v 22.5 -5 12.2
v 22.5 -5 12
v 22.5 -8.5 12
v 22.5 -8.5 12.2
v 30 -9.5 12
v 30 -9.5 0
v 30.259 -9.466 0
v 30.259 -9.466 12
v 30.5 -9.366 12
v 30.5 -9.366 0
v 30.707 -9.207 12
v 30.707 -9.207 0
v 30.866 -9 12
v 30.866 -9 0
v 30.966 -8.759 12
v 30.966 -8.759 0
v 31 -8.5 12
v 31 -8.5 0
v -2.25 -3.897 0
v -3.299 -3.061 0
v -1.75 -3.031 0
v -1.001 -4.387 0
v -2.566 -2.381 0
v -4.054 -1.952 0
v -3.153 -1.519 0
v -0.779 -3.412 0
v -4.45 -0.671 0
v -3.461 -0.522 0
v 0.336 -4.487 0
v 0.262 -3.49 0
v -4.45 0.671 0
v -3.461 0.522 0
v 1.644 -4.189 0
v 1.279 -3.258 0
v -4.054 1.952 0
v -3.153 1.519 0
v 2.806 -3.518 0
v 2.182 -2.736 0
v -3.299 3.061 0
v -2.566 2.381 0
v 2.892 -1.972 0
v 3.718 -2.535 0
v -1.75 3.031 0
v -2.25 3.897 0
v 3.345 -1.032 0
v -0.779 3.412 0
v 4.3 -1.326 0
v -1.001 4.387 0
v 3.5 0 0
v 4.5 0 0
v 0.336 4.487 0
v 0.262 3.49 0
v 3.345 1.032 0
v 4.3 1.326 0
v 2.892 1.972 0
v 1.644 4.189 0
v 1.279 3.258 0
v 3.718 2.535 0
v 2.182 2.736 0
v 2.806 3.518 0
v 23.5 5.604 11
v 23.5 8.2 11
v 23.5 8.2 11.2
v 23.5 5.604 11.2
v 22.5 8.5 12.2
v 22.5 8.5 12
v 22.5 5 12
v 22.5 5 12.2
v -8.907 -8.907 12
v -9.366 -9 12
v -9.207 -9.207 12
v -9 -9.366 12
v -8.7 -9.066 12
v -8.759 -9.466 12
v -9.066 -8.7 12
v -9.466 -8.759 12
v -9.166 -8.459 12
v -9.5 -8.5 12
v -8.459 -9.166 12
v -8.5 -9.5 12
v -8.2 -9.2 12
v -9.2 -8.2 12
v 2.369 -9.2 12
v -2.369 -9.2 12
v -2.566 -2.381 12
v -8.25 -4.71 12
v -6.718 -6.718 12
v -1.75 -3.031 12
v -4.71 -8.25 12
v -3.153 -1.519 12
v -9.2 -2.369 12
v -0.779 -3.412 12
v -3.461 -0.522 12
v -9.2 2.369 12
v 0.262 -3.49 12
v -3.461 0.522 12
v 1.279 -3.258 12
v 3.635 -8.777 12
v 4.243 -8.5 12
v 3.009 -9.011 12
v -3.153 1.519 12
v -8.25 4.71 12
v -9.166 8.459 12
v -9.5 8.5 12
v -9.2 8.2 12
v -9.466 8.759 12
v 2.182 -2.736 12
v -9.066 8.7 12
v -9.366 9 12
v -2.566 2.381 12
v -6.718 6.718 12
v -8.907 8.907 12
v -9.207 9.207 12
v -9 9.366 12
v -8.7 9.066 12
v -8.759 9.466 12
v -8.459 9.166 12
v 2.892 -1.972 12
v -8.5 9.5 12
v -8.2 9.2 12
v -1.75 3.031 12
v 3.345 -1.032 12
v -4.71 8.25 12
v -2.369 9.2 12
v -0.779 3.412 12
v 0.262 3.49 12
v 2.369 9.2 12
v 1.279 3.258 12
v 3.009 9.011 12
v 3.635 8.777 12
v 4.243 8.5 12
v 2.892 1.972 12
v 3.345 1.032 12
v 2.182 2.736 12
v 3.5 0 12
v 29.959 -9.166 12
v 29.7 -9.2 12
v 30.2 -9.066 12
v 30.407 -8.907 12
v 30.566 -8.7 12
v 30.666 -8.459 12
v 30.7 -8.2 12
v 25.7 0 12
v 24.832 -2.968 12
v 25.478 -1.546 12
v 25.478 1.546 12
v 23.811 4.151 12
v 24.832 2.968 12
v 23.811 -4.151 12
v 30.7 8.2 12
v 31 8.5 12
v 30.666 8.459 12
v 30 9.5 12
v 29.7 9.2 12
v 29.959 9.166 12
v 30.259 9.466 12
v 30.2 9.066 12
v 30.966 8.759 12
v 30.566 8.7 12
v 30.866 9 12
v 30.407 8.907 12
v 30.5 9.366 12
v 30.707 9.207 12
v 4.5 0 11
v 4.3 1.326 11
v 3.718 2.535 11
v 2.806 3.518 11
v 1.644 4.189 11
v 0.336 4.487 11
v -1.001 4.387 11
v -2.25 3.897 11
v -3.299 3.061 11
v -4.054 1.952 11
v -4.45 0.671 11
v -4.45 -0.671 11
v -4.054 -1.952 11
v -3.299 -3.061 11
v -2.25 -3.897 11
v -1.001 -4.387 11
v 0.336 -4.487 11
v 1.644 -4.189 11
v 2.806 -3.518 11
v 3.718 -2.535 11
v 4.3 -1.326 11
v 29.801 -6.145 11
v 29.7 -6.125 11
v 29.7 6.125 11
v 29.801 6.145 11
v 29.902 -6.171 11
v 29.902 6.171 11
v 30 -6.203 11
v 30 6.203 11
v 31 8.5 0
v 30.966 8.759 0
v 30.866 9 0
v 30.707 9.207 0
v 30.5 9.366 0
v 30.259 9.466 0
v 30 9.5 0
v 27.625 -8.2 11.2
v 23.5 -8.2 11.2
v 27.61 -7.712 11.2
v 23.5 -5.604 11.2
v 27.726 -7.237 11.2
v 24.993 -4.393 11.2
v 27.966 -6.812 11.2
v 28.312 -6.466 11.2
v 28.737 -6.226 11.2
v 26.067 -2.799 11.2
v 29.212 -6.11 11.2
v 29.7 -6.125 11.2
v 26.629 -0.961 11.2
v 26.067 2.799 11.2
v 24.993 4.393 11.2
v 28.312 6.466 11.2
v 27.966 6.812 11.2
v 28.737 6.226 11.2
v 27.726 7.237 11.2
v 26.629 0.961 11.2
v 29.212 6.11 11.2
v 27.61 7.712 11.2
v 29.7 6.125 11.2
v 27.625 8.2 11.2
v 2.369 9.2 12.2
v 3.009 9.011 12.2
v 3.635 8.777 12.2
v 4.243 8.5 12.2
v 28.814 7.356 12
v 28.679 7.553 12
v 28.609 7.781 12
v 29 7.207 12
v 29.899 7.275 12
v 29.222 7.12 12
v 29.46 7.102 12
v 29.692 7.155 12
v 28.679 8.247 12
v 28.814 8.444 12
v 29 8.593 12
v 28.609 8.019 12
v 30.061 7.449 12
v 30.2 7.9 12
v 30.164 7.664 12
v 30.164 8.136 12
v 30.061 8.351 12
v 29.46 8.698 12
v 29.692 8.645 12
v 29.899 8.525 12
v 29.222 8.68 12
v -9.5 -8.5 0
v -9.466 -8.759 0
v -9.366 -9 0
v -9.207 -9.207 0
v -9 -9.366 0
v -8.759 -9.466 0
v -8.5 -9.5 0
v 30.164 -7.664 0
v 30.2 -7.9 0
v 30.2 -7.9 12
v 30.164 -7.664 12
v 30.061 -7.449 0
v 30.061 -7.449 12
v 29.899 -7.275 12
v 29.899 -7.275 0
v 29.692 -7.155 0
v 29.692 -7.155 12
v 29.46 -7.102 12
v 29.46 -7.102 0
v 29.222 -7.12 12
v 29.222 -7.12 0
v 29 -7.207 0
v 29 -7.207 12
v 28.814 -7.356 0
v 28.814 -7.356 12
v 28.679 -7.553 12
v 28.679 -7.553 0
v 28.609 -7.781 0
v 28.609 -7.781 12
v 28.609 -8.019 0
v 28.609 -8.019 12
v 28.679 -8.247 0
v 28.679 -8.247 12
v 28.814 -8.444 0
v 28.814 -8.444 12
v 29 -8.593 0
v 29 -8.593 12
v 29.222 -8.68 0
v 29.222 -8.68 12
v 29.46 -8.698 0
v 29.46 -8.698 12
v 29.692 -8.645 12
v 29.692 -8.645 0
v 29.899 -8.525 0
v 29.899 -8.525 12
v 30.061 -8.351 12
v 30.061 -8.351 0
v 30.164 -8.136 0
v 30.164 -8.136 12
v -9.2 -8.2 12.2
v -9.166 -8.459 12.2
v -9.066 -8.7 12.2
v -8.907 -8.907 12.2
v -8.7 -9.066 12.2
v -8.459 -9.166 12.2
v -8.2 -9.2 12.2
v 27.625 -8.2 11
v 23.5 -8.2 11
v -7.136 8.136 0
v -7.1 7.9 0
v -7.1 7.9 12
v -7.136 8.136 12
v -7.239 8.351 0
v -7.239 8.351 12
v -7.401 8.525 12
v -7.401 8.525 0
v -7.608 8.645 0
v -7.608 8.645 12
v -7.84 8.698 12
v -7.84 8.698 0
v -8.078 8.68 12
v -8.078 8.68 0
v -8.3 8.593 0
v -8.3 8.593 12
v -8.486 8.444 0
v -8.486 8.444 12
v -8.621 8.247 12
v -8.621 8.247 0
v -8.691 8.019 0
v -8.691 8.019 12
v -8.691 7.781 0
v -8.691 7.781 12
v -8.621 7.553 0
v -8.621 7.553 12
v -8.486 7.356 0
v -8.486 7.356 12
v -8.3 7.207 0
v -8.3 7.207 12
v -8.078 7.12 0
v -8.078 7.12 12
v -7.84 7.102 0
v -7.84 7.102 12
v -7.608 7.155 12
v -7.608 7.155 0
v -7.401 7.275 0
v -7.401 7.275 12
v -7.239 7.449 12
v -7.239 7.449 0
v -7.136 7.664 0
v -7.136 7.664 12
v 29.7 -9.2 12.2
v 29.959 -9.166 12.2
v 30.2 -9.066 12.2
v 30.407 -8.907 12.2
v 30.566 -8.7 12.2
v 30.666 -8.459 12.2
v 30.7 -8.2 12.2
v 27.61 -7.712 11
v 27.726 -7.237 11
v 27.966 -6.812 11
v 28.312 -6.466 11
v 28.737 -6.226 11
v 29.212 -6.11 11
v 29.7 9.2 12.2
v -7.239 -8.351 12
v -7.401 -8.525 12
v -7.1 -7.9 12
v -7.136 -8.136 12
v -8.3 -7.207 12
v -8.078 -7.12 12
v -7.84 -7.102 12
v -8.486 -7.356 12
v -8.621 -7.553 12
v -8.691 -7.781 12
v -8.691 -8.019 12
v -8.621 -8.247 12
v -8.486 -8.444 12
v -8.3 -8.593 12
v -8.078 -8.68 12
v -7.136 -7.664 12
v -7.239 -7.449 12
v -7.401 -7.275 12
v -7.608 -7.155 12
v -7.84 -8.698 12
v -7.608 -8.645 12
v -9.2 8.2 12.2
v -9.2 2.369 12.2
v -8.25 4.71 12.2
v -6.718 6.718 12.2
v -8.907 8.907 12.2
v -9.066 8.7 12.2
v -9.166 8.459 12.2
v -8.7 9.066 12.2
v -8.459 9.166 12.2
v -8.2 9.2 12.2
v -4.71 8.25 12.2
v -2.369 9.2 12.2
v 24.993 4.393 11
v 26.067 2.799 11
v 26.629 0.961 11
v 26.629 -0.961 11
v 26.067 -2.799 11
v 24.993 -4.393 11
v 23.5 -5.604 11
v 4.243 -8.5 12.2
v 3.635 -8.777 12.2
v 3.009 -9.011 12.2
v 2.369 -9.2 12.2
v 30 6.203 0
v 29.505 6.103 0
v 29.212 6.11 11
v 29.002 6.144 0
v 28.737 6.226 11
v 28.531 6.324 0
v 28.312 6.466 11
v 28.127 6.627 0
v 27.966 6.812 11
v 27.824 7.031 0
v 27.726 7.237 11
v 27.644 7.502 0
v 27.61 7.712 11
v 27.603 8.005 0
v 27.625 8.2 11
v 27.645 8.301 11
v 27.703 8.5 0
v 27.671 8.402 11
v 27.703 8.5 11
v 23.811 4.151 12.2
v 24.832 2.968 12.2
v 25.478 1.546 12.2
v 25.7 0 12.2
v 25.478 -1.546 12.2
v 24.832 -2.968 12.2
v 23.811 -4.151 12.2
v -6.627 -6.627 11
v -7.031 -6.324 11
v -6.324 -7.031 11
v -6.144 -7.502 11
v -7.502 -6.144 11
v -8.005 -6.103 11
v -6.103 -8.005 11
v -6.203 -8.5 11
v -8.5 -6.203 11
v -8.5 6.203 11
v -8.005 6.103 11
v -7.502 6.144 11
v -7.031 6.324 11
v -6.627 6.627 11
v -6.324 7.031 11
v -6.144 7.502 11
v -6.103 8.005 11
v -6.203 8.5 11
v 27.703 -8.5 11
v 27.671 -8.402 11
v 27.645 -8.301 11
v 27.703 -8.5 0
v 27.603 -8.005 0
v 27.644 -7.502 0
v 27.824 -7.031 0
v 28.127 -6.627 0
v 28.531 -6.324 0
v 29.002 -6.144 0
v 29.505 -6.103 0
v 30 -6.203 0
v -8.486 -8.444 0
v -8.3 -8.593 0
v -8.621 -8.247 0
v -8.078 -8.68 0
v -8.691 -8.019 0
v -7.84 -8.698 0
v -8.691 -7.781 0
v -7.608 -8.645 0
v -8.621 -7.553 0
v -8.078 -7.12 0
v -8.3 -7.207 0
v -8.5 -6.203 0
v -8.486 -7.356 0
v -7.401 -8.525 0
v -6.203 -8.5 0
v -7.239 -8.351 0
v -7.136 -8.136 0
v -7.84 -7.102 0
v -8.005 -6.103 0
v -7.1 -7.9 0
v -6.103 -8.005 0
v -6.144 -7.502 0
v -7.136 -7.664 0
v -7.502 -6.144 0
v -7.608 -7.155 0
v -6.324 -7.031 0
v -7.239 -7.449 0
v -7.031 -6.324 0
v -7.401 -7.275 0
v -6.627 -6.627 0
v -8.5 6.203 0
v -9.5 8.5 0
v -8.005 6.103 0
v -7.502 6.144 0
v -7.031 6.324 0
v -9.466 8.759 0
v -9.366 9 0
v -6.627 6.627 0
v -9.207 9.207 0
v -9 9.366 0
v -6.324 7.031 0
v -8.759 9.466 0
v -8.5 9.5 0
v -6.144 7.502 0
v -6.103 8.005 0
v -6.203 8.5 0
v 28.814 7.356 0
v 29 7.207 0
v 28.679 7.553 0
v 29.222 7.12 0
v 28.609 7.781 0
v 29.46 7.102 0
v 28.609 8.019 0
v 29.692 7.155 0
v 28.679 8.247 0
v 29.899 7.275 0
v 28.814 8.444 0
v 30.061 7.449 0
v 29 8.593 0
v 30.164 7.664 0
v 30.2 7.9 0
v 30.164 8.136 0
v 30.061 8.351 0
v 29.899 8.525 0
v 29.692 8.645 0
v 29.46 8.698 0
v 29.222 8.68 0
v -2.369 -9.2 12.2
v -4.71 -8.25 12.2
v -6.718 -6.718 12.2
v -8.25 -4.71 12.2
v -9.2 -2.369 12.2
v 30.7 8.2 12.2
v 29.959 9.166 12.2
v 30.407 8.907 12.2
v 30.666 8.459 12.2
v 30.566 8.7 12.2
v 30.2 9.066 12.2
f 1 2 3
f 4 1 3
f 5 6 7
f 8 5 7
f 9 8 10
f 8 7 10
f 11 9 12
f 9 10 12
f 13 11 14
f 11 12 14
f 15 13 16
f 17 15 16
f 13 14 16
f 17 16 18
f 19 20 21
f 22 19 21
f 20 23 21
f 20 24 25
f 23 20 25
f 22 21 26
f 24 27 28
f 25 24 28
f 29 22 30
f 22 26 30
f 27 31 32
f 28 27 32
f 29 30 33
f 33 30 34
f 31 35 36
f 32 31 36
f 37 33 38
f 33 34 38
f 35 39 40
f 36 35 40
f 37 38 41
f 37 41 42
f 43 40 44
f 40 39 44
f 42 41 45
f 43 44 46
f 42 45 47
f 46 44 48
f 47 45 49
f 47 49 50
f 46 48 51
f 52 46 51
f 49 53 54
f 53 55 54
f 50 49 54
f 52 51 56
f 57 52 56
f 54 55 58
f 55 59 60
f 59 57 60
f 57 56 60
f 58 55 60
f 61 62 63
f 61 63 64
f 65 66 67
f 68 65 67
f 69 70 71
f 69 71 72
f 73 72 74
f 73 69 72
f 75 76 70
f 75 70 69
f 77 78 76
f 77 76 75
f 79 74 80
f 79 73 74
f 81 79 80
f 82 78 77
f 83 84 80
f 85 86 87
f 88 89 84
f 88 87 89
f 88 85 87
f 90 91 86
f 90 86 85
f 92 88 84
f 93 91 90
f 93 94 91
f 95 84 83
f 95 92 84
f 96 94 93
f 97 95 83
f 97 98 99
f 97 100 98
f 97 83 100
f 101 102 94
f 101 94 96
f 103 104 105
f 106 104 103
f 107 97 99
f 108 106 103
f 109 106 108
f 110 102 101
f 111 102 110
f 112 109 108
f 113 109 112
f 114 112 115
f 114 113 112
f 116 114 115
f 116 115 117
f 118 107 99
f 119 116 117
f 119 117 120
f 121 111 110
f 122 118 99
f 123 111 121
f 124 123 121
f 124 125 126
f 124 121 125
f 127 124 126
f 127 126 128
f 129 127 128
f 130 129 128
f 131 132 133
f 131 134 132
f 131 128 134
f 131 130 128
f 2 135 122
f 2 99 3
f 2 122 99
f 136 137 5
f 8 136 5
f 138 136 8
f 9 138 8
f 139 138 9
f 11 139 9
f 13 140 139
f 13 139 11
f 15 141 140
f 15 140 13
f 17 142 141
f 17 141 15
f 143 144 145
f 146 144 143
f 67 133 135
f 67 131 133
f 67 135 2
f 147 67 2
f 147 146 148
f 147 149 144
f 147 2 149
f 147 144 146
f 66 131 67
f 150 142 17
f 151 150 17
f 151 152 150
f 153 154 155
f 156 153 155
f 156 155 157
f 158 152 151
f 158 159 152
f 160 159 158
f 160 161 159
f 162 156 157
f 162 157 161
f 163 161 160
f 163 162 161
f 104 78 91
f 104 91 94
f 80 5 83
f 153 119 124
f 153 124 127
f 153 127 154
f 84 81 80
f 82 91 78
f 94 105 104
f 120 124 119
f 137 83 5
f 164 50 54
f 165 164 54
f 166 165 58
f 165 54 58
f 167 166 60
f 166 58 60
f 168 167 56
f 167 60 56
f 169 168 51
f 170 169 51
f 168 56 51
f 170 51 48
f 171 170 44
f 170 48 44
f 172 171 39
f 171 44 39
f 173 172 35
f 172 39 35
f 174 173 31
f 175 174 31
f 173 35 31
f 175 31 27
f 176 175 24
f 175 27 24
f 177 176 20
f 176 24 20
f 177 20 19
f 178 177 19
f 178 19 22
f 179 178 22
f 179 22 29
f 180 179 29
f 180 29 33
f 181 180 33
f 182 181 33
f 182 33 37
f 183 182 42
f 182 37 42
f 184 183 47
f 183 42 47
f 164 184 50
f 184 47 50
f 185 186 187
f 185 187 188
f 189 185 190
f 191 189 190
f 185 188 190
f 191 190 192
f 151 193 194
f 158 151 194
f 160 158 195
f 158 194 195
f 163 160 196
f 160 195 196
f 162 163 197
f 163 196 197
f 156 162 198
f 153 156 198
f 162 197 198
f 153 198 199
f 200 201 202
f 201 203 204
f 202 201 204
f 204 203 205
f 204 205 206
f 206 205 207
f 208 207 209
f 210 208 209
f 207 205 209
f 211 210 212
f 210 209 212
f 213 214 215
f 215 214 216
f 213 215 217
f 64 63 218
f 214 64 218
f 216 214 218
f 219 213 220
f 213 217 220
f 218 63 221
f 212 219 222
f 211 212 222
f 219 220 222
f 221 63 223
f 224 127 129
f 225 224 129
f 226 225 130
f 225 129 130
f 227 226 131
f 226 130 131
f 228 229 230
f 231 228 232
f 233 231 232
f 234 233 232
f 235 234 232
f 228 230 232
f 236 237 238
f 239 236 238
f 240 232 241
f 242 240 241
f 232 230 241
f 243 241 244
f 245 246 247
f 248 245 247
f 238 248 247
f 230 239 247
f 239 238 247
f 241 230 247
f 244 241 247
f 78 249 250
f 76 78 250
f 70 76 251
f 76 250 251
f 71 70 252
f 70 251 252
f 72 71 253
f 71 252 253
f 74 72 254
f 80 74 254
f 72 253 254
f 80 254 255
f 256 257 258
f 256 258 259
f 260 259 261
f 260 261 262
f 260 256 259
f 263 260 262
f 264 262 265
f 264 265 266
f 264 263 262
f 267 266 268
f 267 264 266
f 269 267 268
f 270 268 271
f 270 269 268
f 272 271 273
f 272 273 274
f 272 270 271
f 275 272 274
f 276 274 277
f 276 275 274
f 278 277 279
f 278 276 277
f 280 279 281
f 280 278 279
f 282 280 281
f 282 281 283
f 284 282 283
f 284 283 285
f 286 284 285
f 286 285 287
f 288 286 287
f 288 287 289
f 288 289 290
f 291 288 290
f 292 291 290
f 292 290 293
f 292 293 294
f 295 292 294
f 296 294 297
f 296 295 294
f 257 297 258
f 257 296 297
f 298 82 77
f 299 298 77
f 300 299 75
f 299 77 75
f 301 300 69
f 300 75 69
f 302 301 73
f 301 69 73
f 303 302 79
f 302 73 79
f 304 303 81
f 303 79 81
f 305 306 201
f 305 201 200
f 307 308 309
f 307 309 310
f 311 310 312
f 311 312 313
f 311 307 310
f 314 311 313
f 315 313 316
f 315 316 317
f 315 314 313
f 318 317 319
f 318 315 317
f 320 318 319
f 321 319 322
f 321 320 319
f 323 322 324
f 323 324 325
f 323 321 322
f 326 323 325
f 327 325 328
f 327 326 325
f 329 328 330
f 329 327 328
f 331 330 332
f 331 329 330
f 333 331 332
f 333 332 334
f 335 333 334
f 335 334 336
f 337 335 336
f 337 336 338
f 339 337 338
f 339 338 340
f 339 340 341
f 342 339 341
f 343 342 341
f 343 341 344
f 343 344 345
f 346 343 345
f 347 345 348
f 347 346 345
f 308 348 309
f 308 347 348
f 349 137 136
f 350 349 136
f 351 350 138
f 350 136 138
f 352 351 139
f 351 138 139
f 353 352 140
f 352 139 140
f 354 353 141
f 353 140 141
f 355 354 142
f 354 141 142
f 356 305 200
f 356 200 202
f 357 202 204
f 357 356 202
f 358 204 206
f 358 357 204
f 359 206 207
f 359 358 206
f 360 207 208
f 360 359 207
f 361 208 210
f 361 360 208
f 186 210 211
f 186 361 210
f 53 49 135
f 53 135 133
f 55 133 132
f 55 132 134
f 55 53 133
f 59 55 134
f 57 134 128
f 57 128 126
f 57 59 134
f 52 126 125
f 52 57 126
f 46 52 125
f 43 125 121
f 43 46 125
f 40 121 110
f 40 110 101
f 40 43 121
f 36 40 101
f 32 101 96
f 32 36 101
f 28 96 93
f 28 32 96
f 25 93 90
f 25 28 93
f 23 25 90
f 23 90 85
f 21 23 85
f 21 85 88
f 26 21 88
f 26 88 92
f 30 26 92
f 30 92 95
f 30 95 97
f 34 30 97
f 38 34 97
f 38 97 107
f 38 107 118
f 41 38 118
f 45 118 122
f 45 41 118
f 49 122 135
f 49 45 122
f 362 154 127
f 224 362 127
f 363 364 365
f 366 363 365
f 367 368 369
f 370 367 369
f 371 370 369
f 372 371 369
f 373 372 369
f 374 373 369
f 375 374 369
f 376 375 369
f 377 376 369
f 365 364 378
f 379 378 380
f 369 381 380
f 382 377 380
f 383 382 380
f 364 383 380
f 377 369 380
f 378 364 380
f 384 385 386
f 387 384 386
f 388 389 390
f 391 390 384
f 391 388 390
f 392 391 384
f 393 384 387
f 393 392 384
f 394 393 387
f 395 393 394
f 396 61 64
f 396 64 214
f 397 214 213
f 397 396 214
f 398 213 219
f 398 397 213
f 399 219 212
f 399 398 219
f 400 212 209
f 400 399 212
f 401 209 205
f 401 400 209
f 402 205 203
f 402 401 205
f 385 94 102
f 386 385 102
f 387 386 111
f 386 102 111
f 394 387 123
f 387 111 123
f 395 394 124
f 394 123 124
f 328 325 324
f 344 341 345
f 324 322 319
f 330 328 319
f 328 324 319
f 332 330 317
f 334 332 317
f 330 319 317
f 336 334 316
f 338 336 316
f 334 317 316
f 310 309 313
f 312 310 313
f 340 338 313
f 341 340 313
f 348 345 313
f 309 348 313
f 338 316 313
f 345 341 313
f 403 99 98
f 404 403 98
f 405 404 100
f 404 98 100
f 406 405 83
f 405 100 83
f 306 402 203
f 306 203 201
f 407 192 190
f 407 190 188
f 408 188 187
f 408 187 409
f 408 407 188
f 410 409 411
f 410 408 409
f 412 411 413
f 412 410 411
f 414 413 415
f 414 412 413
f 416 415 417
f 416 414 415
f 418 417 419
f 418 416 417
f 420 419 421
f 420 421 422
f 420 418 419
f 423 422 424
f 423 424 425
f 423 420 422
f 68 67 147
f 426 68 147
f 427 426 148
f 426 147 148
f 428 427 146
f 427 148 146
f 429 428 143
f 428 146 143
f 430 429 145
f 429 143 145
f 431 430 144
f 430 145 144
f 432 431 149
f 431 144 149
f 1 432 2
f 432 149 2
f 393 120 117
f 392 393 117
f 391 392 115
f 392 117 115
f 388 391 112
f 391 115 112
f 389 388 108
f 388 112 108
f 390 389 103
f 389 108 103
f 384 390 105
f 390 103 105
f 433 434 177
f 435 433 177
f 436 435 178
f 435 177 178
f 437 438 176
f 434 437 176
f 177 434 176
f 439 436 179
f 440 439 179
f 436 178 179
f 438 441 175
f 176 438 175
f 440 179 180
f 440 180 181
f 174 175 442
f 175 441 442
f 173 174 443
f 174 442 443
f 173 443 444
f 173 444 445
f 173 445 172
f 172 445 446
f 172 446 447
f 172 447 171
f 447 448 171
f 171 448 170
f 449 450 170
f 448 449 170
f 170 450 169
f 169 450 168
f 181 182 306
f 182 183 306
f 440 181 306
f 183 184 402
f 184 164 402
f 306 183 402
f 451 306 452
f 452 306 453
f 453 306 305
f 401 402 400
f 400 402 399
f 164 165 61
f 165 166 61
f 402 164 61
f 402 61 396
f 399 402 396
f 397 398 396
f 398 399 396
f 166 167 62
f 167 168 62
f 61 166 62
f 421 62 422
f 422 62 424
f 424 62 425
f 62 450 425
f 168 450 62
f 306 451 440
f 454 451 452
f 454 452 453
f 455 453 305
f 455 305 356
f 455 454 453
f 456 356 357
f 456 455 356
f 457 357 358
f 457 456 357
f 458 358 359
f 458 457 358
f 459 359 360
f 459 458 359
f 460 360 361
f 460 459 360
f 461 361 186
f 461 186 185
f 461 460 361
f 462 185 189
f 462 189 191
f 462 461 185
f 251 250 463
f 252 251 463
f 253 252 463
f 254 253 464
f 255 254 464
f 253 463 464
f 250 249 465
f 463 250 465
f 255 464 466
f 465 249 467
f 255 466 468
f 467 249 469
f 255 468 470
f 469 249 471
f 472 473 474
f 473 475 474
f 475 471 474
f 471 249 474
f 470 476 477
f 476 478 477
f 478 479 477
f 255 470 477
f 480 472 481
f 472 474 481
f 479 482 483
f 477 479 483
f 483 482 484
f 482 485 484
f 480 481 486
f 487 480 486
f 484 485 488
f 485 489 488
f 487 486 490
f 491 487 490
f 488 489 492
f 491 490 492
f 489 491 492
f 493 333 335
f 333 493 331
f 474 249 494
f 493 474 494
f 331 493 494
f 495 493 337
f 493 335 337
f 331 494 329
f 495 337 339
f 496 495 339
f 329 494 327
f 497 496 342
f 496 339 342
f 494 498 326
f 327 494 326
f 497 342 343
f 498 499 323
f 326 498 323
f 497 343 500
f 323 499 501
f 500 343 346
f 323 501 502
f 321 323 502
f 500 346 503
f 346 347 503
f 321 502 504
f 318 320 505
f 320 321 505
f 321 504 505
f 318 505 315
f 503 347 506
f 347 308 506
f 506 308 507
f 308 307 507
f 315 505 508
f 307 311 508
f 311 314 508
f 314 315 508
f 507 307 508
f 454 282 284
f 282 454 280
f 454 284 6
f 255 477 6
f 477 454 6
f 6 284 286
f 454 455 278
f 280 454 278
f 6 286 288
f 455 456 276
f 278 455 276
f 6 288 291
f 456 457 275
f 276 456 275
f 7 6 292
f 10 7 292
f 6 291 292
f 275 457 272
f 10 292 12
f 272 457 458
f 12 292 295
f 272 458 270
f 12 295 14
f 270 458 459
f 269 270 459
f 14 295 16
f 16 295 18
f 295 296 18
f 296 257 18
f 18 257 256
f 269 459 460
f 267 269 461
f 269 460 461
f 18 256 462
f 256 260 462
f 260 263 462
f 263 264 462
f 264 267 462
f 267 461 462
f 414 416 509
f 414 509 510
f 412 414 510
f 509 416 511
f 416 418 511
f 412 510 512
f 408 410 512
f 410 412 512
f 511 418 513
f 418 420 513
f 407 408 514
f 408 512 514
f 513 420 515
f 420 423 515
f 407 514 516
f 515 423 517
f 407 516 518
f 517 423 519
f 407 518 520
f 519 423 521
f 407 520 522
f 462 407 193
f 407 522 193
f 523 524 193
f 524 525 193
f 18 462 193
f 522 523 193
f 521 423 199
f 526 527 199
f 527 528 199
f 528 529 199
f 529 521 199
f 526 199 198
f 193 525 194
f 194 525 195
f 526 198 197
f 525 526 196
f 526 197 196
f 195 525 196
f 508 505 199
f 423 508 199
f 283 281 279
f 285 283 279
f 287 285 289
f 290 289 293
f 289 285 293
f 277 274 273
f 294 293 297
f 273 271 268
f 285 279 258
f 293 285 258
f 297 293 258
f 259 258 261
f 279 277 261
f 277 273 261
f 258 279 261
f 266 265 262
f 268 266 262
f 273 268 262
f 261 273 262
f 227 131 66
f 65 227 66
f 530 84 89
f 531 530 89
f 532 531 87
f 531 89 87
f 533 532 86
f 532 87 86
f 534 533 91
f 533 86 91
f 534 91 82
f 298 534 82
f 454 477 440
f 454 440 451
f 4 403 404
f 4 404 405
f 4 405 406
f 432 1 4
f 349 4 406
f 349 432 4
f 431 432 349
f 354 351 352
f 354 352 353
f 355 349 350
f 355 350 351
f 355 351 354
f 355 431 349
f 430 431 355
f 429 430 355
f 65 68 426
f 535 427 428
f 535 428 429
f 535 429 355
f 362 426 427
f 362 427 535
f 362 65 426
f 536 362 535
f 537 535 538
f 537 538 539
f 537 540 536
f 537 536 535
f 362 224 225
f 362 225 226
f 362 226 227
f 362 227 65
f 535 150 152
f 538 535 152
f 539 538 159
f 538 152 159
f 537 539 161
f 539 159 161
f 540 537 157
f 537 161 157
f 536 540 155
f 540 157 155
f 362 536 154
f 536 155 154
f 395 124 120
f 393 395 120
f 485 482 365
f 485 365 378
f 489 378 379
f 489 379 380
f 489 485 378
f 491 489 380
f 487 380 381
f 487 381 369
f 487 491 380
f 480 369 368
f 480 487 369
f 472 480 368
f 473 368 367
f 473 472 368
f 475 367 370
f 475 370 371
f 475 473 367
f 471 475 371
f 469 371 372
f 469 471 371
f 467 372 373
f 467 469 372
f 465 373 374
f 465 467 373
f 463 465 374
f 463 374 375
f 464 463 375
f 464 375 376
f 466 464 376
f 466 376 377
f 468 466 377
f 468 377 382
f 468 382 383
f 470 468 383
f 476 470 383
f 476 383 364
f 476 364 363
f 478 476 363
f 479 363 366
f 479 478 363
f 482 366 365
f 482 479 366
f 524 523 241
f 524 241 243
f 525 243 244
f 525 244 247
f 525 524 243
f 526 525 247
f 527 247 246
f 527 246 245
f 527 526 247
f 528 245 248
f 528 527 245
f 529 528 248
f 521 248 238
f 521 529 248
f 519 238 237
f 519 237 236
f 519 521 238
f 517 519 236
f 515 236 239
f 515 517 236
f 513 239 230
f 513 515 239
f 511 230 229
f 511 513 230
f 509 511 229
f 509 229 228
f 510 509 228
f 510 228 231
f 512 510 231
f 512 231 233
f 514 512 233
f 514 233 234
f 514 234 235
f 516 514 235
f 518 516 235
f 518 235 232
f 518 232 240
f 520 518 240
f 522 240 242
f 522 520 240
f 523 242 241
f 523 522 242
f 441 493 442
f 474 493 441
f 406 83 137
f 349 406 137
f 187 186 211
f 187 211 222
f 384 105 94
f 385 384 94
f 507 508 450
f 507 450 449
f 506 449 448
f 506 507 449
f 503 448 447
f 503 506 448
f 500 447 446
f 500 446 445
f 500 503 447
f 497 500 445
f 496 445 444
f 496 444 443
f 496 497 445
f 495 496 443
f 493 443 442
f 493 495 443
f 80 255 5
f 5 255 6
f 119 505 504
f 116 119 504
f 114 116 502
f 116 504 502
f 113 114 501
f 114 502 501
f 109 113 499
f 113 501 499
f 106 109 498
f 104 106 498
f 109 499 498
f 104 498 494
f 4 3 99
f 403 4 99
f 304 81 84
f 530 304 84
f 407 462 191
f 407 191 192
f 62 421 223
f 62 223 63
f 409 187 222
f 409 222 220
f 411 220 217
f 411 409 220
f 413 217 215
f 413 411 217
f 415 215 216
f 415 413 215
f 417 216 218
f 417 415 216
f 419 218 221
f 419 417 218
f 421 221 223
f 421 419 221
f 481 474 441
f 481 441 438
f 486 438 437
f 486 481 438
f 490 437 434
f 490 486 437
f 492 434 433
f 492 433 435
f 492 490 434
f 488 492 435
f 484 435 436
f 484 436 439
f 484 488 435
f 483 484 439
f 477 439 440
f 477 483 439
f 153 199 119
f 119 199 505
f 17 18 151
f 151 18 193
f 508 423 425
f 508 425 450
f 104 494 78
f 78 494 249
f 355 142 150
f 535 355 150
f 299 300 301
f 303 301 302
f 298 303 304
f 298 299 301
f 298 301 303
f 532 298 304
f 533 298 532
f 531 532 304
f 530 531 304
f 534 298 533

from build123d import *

# Parameters (mm, degrees)
CROQUIS1_R              = 3.5
CROQUIS1_R_2            = 0.8
SALIENTE_EXTRUIR1_DEPTH = 12
SALIENTE_EXTRUIR2_DEPTH = 0.2
VACIADO6_OUTLINE_R      = 4.5
VACIADO6_DEPTH          = 11
VACIADO6_START          = 11
VACIADO6_2_DEPTH        = 0.2


# Read off the part's stored shape, not the designer's step: Vaciado6
with BuildPart() as part:
    # Croquis1 → Saliente-Extruir1 (new body)
    with BuildSketch(Plane.XY):
        with BuildLine():
            Line((-9.5, 8.5), (-9.5, -8.5))
            ThreePointArc((-9.5, -8.5), (-9.207106781, -9.207106781), (-8.5, -9.5))
            Line((-8.5, -9.5), (30, -9.5))
            ThreePointArc((30, -9.5), (30.707106781, -9.207106781), (31, -8.5))
            Line((31, -8.5), (31, 8.5))
            ThreePointArc((31, 8.5), (30.707106781, 9.207106781), (30, 9.5))
            Line((30, 9.5), (-8.5, 9.5))
            ThreePointArc((-8.5, 9.5), (-9.207106781, 9.207106781), (-9.5, 8.5))
        make_face()
        Circle(CROQUIS1_R, mode=Mode.SUBTRACT)
        with Locations((29.4, -7.9)):
            Circle(CROQUIS1_R_2, mode=Mode.SUBTRACT)
        with Locations((-7.9, -7.9)):
            Circle(CROQUIS1_R_2, mode=Mode.SUBTRACT)
        with Locations((-7.9, 7.9)):
            Circle(CROQUIS1_R_2, mode=Mode.SUBTRACT)
        with Locations((29.4, 7.9)):
            Circle(CROQUIS1_R_2, mode=Mode.SUBTRACT)
    extrude(amount=SALIENTE_EXTRUIR1_DEPTH)

    # Croquis2 → Saliente-Extruir2 (add)
    with BuildSketch(Plane.XY.offset(12)):
        with BuildLine():
            Line((2.368543856, -9.2), (29.7, -9.2))
            ThreePointArc((29.7, -9.2), (30.407106781, -8.907106781), (30.7, -8.2))
            Line((30.7, -8.2), (30.7, 8.2))
            ThreePointArc((30.7, 8.2), (30.407106781, 8.907106781), (29.7, 9.2))
            Line((29.7, 9.2), (2.368543856, 9.2))
            ThreePointArc((2.368543856, 9.2), (3.324069835, 8.899469632), (4.242640687, 8.5))
            Line((4.242640687, 8.5), (22.5, 8.5))
            Line((22.5, 8.5), (22.5, 5))
            ThreePointArc((22.5, 5), (25.7, 0), (22.5, -5))
            Line((22.5, -5), (22.5, -8.5))
            Line((22.5, -8.5), (4.242640687, -8.5))
            ThreePointArc((4.242640687, -8.5), (3.324069835, -8.899469632), (2.368543856, -9.2))
        make_face()
        with BuildLine():
            Line((-8.2, -9.2), (-2.368543856, -9.2))
            ThreePointArc((-2.368543856, -9.2), (-6.717514421, -6.717514421), (-9.2, -2.368543856))
            Line((-9.2, -2.368543856), (-9.2, -8.2))
            ThreePointArc((-9.2, -8.2), (-8.907106781, -8.907106781), (-8.2, -9.2))
        make_face()
        with BuildLine():
            Line((-9.2, 8.2), (-9.2, 2.368543856))
            ThreePointArc((-9.2, 2.368543856), (-6.717514421, 6.717514421), (-2.368543856, 9.2))
            Line((-2.368543856, 9.2), (-8.2, 9.2))
            ThreePointArc((-8.2, 9.2), (-8.907106781, 8.907106781), (-9.2, 8.2))
        make_face()
    extrude(amount=SALIENTE_EXTRUIR2_DEPTH)

    # Vaciado6 outline → Vaciado6 (cut)
    with BuildSketch(Plane.XY):
        with BuildLine():
            Line((27.702943725, 8.5), (-6.202943725, 8.5))
            ThreePointArc((-6.202943725, 8.5), (-6.627207794, 6.627207794), (-8.5, 6.202943725))
            Line((-8.5, 6.202943725), (-8.5, -6.202943725))
            ThreePointArc((-8.5, -6.202943725), (-6.627207794, -6.627207794), (-6.202943725, -8.5))
            Line((-6.202943725, -8.5), (27.702943725, -8.5))
            ThreePointArc((27.702943725, -8.5), (28.127207794, -6.627207794), (30, -6.202943725))
            Line((30, -6.202943725), (30, 6.202943725))
            ThreePointArc((30, 6.202943725), (28.127207794, 6.627207794), (27.702943725, 8.5))
        make_face()
        Circle(VACIADO6_OUTLINE_R, mode=Mode.SUBTRACT)
    extrude(amount=VACIADO6_DEPTH, mode=Mode.SUBTRACT)

    # Vaciado6 2 outline → Vaciado6 2 (cut)
    with BuildSketch(Plane.XY.offset(VACIADO6_START)):
        with BuildLine():
            ThreePointArc((29.7, 6.125176065), (28.127207794, 6.627207794), (27.625176065, 8.2))
            Line((27.625176065, 8.2), (23.5, 8.2))
            Line((23.5, 8.2), (23.5, 5.60357029))
            ThreePointArc((23.5, 5.60357029), (26.7, 0), (23.5, -5.60357029))
            Line((23.5, -5.60357029), (23.5, -8.2))
            Line((23.5, -8.2), (27.625176065, -8.2))
            ThreePointArc((27.625176065, -8.2), (28.127207794, -6.627207794), (29.7, -6.125176065))
            Line((29.7, -6.125176065), (29.7, 6.125176065))
        make_face()
    extrude(amount=VACIADO6_2_DEPTH, mode=Mode.SUBTRACT)


solid = part.part
